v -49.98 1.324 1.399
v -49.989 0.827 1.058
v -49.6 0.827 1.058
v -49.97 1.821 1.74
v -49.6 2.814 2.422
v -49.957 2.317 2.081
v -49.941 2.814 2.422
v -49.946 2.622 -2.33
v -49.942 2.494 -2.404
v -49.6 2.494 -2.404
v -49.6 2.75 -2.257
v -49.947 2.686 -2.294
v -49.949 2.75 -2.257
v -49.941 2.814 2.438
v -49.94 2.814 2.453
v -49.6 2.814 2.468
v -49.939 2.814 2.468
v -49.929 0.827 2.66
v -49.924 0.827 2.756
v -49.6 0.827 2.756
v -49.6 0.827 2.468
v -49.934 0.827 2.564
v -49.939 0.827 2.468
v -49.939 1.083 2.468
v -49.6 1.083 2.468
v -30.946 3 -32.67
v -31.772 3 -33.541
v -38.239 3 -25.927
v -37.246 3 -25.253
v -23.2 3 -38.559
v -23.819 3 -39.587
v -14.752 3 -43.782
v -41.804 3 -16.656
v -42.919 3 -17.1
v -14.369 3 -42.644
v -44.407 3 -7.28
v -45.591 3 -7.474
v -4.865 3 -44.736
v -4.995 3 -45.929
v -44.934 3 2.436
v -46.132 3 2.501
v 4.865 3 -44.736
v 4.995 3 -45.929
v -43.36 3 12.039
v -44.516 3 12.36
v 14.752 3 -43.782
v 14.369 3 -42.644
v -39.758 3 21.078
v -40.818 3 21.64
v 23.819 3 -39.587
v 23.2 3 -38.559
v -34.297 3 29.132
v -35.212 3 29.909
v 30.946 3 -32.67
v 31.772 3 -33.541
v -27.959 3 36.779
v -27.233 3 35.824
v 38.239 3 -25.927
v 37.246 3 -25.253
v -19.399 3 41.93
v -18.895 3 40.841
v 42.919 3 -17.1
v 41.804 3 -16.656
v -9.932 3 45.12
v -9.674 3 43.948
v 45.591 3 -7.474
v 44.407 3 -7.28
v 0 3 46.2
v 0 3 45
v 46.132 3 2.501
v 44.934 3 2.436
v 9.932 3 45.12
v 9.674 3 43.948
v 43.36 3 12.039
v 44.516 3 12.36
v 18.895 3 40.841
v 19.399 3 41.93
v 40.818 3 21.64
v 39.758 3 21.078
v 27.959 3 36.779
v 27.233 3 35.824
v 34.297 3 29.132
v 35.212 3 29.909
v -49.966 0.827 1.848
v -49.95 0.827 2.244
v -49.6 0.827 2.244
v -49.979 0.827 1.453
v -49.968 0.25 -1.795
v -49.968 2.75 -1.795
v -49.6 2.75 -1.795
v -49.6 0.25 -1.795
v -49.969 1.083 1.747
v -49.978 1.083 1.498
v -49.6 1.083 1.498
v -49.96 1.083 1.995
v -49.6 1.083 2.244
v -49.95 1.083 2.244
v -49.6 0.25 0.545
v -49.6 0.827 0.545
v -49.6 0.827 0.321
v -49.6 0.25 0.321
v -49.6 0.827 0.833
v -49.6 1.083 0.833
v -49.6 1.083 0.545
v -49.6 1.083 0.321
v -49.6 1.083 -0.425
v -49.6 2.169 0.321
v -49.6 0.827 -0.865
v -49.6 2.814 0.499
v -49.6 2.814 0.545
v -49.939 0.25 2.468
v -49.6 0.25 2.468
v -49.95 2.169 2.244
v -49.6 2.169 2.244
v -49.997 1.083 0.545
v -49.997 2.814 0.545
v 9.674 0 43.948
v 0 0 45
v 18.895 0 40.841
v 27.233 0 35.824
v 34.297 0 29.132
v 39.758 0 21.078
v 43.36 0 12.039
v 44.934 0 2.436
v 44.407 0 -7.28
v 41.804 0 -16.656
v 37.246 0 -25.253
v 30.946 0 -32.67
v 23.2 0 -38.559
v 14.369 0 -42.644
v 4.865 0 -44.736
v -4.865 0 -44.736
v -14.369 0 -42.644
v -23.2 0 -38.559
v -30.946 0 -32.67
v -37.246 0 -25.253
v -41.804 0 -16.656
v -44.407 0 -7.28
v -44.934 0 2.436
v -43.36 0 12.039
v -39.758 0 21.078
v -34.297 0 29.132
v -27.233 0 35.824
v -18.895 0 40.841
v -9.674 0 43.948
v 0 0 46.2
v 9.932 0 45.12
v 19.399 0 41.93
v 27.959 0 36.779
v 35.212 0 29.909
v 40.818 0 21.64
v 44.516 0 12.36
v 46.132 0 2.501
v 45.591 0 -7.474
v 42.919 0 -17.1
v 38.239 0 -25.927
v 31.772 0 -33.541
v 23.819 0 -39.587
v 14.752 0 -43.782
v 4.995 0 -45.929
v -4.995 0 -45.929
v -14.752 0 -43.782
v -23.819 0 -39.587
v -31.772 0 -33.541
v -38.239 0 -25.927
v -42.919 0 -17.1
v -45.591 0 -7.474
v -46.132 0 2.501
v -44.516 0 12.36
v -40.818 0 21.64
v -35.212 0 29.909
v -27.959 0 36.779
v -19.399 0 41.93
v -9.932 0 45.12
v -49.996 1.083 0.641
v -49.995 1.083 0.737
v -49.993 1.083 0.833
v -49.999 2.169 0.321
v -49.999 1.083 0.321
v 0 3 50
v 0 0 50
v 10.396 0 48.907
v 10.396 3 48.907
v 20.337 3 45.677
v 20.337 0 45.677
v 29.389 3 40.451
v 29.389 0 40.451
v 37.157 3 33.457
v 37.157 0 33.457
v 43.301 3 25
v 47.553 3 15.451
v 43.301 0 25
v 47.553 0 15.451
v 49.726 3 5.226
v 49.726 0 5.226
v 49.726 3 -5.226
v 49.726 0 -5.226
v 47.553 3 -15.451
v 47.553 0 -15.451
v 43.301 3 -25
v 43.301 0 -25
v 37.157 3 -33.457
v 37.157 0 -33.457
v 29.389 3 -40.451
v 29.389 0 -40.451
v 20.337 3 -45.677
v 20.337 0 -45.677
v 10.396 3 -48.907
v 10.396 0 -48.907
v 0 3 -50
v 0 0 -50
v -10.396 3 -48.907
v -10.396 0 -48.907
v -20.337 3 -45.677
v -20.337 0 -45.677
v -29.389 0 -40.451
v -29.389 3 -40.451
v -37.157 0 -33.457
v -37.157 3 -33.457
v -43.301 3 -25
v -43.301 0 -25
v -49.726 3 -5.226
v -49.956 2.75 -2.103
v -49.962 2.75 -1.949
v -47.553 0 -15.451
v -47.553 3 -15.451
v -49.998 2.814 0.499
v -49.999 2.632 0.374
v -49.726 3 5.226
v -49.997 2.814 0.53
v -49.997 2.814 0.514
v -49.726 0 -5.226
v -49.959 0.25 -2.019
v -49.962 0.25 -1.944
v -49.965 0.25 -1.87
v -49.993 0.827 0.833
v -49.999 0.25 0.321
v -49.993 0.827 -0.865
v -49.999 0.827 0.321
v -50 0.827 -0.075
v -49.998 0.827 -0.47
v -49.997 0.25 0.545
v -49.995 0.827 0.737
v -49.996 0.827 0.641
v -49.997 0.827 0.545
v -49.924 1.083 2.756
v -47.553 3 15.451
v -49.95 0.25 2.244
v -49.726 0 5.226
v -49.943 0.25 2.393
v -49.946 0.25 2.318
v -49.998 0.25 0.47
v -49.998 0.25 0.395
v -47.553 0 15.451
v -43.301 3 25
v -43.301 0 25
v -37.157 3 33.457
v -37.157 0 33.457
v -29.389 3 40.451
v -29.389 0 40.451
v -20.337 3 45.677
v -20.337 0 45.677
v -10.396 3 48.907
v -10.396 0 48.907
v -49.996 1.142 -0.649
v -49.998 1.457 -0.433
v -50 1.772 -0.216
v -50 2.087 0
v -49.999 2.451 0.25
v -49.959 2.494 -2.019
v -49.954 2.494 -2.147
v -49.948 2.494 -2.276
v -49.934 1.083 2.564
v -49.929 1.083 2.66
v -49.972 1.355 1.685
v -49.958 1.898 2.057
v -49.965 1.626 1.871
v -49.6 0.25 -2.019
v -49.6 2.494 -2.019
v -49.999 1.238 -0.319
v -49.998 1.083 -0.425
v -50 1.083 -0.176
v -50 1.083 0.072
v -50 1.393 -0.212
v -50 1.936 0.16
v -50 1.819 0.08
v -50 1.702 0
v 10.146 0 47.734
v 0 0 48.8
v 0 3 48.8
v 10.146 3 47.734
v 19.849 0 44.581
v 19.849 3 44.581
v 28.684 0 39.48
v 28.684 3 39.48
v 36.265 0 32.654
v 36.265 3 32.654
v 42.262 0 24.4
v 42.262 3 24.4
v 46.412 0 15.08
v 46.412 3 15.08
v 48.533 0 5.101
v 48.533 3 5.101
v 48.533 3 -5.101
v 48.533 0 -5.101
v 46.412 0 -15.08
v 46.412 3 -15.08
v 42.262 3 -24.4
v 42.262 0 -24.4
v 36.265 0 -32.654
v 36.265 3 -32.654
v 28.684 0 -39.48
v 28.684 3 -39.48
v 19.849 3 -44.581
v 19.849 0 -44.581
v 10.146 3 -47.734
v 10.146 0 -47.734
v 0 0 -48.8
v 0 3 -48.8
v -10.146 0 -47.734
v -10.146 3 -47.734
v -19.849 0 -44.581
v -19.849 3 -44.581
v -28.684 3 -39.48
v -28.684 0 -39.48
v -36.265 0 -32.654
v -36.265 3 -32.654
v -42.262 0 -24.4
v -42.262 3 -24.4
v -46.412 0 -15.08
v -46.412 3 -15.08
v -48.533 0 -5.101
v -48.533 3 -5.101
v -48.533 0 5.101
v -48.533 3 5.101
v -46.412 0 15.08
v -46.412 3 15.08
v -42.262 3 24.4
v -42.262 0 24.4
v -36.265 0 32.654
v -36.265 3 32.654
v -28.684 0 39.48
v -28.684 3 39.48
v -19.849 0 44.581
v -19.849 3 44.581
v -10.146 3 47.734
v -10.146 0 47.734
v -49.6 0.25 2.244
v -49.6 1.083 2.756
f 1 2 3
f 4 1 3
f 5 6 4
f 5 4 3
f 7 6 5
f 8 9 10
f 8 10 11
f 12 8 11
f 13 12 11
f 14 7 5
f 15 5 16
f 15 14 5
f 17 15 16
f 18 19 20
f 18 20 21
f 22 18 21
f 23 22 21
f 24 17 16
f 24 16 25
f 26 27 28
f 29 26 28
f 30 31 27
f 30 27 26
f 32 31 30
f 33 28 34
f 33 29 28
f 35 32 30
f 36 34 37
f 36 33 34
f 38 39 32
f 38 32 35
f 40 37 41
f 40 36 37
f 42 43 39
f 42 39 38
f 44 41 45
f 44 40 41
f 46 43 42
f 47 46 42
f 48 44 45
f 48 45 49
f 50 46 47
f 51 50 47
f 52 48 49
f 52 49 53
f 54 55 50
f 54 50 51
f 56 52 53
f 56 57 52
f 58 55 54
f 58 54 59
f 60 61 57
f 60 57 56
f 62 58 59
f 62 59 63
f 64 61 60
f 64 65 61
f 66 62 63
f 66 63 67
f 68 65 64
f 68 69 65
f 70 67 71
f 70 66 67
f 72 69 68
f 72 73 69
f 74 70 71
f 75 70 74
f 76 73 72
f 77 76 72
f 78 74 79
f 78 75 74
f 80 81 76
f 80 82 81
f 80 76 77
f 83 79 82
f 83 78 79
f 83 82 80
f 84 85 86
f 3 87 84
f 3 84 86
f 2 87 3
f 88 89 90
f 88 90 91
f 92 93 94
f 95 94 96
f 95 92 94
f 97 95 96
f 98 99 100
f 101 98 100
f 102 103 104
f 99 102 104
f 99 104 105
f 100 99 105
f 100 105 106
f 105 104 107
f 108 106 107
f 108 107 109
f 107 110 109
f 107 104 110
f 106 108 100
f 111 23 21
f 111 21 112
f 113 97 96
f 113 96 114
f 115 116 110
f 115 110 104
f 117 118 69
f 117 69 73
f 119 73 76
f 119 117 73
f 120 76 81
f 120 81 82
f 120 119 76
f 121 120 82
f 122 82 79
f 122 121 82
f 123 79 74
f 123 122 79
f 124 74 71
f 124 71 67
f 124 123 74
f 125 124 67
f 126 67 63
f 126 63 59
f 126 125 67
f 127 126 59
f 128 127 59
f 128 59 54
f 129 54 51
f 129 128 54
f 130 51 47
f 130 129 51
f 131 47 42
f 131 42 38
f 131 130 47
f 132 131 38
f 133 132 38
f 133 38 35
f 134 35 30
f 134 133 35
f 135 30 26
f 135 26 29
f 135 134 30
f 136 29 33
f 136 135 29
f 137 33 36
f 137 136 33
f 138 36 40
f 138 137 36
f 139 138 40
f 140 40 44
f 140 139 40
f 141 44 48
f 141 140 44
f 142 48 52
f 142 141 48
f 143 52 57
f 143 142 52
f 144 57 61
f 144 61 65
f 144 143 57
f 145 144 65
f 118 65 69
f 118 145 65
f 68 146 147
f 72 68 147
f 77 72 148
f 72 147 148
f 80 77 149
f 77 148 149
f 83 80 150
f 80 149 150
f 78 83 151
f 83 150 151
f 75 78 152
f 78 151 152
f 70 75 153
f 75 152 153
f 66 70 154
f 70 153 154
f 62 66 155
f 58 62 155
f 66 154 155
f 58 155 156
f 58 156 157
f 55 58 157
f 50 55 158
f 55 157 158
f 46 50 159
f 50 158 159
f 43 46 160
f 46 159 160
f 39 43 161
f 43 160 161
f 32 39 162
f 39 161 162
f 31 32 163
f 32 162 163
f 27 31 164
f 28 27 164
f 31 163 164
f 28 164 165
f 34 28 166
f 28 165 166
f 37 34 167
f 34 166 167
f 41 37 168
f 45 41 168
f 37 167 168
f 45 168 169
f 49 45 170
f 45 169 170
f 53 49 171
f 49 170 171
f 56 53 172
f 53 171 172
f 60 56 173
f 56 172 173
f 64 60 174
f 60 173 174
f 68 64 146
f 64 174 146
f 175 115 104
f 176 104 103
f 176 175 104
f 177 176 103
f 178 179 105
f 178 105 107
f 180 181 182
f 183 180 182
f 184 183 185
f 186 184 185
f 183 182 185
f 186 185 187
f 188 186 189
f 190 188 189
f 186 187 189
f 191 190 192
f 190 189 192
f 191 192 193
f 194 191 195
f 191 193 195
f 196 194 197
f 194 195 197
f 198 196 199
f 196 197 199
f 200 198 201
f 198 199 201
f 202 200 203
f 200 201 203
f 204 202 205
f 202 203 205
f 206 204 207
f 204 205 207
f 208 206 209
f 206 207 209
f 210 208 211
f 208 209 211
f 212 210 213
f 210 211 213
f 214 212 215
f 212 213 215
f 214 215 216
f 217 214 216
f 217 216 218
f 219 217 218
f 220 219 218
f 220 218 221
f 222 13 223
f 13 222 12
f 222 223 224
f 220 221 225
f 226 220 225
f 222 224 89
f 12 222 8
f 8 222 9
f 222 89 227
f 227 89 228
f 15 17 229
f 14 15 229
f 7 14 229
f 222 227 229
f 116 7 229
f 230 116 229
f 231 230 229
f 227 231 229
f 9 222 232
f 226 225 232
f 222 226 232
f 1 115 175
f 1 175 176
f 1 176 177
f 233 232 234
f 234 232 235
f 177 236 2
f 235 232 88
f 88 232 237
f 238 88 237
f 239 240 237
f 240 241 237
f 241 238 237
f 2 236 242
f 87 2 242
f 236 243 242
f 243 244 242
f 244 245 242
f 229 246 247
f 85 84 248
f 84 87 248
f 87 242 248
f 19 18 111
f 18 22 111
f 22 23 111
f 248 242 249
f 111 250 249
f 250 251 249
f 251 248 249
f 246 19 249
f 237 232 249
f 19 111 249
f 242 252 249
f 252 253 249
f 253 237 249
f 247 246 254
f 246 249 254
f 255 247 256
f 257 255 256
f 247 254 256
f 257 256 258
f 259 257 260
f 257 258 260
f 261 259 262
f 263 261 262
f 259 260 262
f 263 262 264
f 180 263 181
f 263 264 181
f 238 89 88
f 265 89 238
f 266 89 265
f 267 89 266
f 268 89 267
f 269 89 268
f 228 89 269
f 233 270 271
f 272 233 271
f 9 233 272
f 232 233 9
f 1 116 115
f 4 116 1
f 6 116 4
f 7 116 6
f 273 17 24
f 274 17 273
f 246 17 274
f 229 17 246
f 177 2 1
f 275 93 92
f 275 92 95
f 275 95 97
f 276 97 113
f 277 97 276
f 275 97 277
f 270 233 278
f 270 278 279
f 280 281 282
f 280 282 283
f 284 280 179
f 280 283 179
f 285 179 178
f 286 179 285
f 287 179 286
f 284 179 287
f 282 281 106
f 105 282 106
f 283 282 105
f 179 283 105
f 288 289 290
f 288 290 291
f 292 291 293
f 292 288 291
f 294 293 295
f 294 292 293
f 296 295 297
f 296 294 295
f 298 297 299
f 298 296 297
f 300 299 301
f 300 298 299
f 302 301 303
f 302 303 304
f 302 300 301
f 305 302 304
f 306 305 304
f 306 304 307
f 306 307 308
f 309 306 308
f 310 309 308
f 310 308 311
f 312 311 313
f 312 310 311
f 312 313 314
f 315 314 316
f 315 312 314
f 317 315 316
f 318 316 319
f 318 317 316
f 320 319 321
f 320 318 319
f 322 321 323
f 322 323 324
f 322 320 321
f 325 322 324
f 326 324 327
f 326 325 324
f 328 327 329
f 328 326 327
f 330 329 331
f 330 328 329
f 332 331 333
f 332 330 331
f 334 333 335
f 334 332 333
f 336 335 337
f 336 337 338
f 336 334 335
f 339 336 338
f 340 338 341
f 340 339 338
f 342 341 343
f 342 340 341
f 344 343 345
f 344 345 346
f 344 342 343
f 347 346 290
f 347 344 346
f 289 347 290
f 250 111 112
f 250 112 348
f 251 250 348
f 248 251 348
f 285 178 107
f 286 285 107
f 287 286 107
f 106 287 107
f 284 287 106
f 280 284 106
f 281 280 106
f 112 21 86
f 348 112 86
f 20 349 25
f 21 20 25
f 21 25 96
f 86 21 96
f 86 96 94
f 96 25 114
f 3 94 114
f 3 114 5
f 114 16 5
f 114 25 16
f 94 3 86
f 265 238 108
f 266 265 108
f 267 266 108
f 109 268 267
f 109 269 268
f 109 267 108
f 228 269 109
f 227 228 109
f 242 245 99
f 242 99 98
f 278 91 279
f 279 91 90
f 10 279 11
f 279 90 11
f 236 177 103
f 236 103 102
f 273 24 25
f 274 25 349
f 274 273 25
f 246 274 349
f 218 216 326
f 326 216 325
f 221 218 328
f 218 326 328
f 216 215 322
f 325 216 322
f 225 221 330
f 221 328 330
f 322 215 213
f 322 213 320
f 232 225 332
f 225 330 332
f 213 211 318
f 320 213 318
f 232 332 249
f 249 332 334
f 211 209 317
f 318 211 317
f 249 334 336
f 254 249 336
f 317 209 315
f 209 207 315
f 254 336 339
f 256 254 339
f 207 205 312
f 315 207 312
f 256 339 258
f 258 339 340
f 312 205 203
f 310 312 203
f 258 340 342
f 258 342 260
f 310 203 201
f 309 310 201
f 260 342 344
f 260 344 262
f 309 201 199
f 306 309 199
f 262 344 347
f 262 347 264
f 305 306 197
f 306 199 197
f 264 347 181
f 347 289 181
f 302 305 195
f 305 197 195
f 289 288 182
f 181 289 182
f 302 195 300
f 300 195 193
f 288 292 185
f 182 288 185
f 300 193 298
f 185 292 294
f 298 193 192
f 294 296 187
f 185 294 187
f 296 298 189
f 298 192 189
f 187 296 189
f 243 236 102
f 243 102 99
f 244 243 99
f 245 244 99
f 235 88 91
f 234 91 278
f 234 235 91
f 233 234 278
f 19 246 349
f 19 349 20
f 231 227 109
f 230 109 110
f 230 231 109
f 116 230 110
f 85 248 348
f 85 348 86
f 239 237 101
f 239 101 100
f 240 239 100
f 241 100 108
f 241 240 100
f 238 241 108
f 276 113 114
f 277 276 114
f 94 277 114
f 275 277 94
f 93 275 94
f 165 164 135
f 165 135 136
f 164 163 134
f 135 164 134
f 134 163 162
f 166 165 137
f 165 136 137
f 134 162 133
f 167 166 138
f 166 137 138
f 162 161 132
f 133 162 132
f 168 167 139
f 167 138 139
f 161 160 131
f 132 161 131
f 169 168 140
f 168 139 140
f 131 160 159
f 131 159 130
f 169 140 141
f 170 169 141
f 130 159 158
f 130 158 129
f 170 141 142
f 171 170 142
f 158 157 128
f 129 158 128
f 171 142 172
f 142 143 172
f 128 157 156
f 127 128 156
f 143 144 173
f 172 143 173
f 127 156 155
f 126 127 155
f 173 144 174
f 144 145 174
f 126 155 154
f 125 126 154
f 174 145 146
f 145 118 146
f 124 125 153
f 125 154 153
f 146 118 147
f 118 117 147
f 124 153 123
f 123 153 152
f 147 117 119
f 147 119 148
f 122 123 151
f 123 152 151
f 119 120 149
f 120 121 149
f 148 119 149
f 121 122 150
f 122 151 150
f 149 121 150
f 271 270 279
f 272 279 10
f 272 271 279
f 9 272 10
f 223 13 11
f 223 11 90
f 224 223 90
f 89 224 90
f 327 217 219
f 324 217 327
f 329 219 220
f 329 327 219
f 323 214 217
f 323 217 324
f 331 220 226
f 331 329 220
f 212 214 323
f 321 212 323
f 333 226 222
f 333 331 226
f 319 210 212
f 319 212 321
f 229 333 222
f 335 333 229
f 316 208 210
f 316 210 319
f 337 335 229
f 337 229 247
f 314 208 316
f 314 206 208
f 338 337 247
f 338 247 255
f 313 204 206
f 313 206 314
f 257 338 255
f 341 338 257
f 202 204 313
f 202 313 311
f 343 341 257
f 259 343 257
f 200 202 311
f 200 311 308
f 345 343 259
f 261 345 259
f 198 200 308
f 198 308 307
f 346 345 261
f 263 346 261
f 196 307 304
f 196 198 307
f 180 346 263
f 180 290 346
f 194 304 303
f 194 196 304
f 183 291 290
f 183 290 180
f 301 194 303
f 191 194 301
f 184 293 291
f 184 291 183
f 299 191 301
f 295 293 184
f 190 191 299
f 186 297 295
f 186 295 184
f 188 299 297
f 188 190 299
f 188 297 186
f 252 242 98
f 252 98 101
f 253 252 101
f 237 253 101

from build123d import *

# Parameters (mm, degrees)
SKETCH1_R           = 46.2
SKETCH1_R_2         = 45
BOSS_EXTRUDE1_DEPTH = 3
SKETCH2_R           = 50
SKETCH2_R_2         = 48.8
BOSS_EXTRUDE2_DEPTH = 3
CUT_EXTRUDE1_DEPTH  = 0.4


with BuildPart() as part:
    # Sketch1 → Boss-Extrude1 (new body)
    with BuildSketch(Plane(origin=(0, 0, 0), x_dir=(1, 0, 0), z_dir=(0, 1, 0))):
        with Locations(Location((0, 0, 0), (0, 0, 270))):
            Circle(SKETCH1_R)
        with Locations(Location((0, 0, 0), (0, 0, 270))):
            Circle(SKETCH1_R_2, mode=Mode.SUBTRACT)
    extrude(amount=BOSS_EXTRUDE1_DEPTH)


with BuildPart() as body_2:
    # Sketch2 → Boss-Extrude2 (new body)
    with BuildSketch(Plane(origin=(0, 0, 0), x_dir=(1, 0, 0), z_dir=(0, 1, 0))):
        with Locations(Location((0, 0, 0), (0, 0, 270))):
            Circle(SKETCH2_R)
        with Locations(Location((0, 0, 0), (0, 0, 270))):
            Circle(SKETCH2_R_2, mode=Mode.SUBTRACT)
    extrude(amount=BOSS_EXTRUDE2_DEPTH)

    # Sketch3 → Cut-Extrude1 (cut)
    # profile 1 of 3: a face of its own
    with BuildSketch(Plane.ZY.offset(50)):
        Polygon((-2.257111378, 2.75), (-1.794871795, 2.75), (-1.794871795, 0.25), (-2.019230769, 0.25), (-2.019230769, 2.493589744), (-2.403846154, 2.493589744), align=None)
    # profile 2 of 3: a face of its own
    with BuildSketch(Plane.ZY.offset(50)):
        Polygon((0.499298878, 2.814102564), (0.544871795, 2.814102564), (0.544871795, 1.083333333), (0.833333333, 1.083333333), (0.833333333, 0.826923077), (0.544871795, 0.826923077), (0.544871795, 0.25), (0.320512821, 0.25), (0.320512821, 0.826923077), (-0.865384615, 0.826923077), align=None)
        Polygon((0.320512821, 1.083333333), (0.320512821, 2.169070513), (-0.424679487, 1.083333333), align=None, mode=Mode.SUBTRACT)
    # profile 3 of 3: a face of its own
    with BuildSketch(Plane.ZY.offset(50)):
        Polygon((2.422375801, 2.814102564), (2.467948718, 2.814102564), (2.467948718, 1.083333333), (2.756410256, 1.083333333), (2.756410256, 0.826923077), (2.467948718, 0.826923077), (2.467948718, 0.25), (2.243589744, 0.25), (2.243589744, 0.826923077), (1.057692308, 0.826923077), align=None)
        Polygon((2.243589744, 1.083333333), (2.243589744, 2.169070513), (1.498397436, 1.083333333), align=None, mode=Mode.SUBTRACT)
    extrude(amount=-CUT_EXTRUDE1_DEPTH, mode=Mode.SUBTRACT)


solid = Compound([part.part, body_2.part])
